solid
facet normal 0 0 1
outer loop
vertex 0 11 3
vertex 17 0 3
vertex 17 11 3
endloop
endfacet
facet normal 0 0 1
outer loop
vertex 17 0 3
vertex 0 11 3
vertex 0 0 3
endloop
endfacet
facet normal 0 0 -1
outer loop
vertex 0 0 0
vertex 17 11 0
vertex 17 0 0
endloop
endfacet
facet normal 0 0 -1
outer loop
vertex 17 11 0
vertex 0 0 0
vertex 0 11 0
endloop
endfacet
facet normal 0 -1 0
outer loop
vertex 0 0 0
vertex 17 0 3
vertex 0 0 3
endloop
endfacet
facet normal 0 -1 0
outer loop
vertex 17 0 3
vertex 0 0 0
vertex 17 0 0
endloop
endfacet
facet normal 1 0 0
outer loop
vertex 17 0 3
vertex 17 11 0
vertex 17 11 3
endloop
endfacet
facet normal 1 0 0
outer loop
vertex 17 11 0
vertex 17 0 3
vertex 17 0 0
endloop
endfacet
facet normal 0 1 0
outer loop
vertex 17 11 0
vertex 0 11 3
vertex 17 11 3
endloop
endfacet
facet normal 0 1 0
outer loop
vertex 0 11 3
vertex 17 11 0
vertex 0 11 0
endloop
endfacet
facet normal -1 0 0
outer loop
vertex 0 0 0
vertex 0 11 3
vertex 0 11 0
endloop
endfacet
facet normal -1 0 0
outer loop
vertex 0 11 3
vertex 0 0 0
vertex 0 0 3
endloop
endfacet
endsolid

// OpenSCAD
// Generated by SolidPython 1.0.1 on 2020-07-29 00:46:56


cube(size = [17, 11, 3]);
/***********************************************
*********      SolidPython code:      **********
************************************************
 
# import packages: SolidPython
from solid import *
from solid.utils import *
from itertools import chain, combinations, permutations


class Resize:

    def __init__(self, scad_file):
        self.scad_file = scad_file
        #self.scad_file = import_scad(scad_file)
        # cone/cylinder param:
        self.r1 = 0
        self.r2 = 0
        self.h = 0
        # rectangular prism param:
        self.w = 0
        self.l = 0
        # ellipse param:
        self.r = 0

    # import OpenScad code (file name corresponds to shape)


    # classify shape + parameters
    def assign(self, param1, param2, param3):
        if self.scad_file == 'cone.scad':
            self.r1 = param1
            self.r2 = param2
            self.h = param3
        elif self.scad_file == 'cylinder.scad':
            self.r1 = param1
            self.r2 = param2
            self.h = param3
        elif self.scad_file == 'rectangularPrism.scad':
            self.h = param1
            self.l = param2
            self.w = param3
        else:
            self.r = param1
            self.h = param2

    # resize parameters
    def iterate(self):
        x = range(3, 20, 2)
        i = 1
        if self.scad_file == 'cone.scad':
            tempList = list(permutations(x, 2))
            for temp in tempList:
                param1 = temp[0]
                param2 = temp[1]
                filepath = 'produced_scad_files/' + 'cone' + str(param1) + '_' + str(param2) + '_' + '.scad'
                scad_render_to_file(cylinder(h=param1, r1=param2, r2=0), filepath)

        elif self.scad_file == 'cylinder.scad':
            tempList = list(permutations(x, 3))
            for temp in tempList:
                param1 = temp[0]
                param2 = temp[1]
                filepath = 'produced_scad_files/' + 'cylinder' + str(param1) + '_' + str(param2) + '_' + '.scad'
                scad_render_to_file(cylinder(h=param1, r1=param2, r2=param2), filepath)

        elif self.scad_file == 'rectangularPrism.scad':
            tempList = list(permutations(x, 3))
            for temp in tempList:
                param1 = temp[0]
                param2 = temp[1]
                param3 = temp[2]
                filepath = 'produced_scad_files/' + 'rectangularPrism' + str(param1) + '_' + str(param2) + '_' + str(
                    param3) + '.scad'
                scad_render_to_file(cube(size=(param1, param2, param3)), filepath)

        elif self.scad_file == 'ellipse.scad':
            tempList = list(permutations(x, 4))
            for temp in tempList:
                param1 = temp[0]
                param2 = temp[1]
                param3 = temp[2]
                param4 = temp[3]
                filepath = 'produced_scad_files/' + 'ellipse' + str(param1) + '_' + str(param2) + '_' + str(param3) + '_' + str(param4) + '.scad'
                scad_render_to_file(scale([param1, param2, param3])(sphere(r=param4)), filepath)

    def render_to_scadfile(self):
        scad_render_to_file(scad, 'example.scad') 
 
************************************************/
